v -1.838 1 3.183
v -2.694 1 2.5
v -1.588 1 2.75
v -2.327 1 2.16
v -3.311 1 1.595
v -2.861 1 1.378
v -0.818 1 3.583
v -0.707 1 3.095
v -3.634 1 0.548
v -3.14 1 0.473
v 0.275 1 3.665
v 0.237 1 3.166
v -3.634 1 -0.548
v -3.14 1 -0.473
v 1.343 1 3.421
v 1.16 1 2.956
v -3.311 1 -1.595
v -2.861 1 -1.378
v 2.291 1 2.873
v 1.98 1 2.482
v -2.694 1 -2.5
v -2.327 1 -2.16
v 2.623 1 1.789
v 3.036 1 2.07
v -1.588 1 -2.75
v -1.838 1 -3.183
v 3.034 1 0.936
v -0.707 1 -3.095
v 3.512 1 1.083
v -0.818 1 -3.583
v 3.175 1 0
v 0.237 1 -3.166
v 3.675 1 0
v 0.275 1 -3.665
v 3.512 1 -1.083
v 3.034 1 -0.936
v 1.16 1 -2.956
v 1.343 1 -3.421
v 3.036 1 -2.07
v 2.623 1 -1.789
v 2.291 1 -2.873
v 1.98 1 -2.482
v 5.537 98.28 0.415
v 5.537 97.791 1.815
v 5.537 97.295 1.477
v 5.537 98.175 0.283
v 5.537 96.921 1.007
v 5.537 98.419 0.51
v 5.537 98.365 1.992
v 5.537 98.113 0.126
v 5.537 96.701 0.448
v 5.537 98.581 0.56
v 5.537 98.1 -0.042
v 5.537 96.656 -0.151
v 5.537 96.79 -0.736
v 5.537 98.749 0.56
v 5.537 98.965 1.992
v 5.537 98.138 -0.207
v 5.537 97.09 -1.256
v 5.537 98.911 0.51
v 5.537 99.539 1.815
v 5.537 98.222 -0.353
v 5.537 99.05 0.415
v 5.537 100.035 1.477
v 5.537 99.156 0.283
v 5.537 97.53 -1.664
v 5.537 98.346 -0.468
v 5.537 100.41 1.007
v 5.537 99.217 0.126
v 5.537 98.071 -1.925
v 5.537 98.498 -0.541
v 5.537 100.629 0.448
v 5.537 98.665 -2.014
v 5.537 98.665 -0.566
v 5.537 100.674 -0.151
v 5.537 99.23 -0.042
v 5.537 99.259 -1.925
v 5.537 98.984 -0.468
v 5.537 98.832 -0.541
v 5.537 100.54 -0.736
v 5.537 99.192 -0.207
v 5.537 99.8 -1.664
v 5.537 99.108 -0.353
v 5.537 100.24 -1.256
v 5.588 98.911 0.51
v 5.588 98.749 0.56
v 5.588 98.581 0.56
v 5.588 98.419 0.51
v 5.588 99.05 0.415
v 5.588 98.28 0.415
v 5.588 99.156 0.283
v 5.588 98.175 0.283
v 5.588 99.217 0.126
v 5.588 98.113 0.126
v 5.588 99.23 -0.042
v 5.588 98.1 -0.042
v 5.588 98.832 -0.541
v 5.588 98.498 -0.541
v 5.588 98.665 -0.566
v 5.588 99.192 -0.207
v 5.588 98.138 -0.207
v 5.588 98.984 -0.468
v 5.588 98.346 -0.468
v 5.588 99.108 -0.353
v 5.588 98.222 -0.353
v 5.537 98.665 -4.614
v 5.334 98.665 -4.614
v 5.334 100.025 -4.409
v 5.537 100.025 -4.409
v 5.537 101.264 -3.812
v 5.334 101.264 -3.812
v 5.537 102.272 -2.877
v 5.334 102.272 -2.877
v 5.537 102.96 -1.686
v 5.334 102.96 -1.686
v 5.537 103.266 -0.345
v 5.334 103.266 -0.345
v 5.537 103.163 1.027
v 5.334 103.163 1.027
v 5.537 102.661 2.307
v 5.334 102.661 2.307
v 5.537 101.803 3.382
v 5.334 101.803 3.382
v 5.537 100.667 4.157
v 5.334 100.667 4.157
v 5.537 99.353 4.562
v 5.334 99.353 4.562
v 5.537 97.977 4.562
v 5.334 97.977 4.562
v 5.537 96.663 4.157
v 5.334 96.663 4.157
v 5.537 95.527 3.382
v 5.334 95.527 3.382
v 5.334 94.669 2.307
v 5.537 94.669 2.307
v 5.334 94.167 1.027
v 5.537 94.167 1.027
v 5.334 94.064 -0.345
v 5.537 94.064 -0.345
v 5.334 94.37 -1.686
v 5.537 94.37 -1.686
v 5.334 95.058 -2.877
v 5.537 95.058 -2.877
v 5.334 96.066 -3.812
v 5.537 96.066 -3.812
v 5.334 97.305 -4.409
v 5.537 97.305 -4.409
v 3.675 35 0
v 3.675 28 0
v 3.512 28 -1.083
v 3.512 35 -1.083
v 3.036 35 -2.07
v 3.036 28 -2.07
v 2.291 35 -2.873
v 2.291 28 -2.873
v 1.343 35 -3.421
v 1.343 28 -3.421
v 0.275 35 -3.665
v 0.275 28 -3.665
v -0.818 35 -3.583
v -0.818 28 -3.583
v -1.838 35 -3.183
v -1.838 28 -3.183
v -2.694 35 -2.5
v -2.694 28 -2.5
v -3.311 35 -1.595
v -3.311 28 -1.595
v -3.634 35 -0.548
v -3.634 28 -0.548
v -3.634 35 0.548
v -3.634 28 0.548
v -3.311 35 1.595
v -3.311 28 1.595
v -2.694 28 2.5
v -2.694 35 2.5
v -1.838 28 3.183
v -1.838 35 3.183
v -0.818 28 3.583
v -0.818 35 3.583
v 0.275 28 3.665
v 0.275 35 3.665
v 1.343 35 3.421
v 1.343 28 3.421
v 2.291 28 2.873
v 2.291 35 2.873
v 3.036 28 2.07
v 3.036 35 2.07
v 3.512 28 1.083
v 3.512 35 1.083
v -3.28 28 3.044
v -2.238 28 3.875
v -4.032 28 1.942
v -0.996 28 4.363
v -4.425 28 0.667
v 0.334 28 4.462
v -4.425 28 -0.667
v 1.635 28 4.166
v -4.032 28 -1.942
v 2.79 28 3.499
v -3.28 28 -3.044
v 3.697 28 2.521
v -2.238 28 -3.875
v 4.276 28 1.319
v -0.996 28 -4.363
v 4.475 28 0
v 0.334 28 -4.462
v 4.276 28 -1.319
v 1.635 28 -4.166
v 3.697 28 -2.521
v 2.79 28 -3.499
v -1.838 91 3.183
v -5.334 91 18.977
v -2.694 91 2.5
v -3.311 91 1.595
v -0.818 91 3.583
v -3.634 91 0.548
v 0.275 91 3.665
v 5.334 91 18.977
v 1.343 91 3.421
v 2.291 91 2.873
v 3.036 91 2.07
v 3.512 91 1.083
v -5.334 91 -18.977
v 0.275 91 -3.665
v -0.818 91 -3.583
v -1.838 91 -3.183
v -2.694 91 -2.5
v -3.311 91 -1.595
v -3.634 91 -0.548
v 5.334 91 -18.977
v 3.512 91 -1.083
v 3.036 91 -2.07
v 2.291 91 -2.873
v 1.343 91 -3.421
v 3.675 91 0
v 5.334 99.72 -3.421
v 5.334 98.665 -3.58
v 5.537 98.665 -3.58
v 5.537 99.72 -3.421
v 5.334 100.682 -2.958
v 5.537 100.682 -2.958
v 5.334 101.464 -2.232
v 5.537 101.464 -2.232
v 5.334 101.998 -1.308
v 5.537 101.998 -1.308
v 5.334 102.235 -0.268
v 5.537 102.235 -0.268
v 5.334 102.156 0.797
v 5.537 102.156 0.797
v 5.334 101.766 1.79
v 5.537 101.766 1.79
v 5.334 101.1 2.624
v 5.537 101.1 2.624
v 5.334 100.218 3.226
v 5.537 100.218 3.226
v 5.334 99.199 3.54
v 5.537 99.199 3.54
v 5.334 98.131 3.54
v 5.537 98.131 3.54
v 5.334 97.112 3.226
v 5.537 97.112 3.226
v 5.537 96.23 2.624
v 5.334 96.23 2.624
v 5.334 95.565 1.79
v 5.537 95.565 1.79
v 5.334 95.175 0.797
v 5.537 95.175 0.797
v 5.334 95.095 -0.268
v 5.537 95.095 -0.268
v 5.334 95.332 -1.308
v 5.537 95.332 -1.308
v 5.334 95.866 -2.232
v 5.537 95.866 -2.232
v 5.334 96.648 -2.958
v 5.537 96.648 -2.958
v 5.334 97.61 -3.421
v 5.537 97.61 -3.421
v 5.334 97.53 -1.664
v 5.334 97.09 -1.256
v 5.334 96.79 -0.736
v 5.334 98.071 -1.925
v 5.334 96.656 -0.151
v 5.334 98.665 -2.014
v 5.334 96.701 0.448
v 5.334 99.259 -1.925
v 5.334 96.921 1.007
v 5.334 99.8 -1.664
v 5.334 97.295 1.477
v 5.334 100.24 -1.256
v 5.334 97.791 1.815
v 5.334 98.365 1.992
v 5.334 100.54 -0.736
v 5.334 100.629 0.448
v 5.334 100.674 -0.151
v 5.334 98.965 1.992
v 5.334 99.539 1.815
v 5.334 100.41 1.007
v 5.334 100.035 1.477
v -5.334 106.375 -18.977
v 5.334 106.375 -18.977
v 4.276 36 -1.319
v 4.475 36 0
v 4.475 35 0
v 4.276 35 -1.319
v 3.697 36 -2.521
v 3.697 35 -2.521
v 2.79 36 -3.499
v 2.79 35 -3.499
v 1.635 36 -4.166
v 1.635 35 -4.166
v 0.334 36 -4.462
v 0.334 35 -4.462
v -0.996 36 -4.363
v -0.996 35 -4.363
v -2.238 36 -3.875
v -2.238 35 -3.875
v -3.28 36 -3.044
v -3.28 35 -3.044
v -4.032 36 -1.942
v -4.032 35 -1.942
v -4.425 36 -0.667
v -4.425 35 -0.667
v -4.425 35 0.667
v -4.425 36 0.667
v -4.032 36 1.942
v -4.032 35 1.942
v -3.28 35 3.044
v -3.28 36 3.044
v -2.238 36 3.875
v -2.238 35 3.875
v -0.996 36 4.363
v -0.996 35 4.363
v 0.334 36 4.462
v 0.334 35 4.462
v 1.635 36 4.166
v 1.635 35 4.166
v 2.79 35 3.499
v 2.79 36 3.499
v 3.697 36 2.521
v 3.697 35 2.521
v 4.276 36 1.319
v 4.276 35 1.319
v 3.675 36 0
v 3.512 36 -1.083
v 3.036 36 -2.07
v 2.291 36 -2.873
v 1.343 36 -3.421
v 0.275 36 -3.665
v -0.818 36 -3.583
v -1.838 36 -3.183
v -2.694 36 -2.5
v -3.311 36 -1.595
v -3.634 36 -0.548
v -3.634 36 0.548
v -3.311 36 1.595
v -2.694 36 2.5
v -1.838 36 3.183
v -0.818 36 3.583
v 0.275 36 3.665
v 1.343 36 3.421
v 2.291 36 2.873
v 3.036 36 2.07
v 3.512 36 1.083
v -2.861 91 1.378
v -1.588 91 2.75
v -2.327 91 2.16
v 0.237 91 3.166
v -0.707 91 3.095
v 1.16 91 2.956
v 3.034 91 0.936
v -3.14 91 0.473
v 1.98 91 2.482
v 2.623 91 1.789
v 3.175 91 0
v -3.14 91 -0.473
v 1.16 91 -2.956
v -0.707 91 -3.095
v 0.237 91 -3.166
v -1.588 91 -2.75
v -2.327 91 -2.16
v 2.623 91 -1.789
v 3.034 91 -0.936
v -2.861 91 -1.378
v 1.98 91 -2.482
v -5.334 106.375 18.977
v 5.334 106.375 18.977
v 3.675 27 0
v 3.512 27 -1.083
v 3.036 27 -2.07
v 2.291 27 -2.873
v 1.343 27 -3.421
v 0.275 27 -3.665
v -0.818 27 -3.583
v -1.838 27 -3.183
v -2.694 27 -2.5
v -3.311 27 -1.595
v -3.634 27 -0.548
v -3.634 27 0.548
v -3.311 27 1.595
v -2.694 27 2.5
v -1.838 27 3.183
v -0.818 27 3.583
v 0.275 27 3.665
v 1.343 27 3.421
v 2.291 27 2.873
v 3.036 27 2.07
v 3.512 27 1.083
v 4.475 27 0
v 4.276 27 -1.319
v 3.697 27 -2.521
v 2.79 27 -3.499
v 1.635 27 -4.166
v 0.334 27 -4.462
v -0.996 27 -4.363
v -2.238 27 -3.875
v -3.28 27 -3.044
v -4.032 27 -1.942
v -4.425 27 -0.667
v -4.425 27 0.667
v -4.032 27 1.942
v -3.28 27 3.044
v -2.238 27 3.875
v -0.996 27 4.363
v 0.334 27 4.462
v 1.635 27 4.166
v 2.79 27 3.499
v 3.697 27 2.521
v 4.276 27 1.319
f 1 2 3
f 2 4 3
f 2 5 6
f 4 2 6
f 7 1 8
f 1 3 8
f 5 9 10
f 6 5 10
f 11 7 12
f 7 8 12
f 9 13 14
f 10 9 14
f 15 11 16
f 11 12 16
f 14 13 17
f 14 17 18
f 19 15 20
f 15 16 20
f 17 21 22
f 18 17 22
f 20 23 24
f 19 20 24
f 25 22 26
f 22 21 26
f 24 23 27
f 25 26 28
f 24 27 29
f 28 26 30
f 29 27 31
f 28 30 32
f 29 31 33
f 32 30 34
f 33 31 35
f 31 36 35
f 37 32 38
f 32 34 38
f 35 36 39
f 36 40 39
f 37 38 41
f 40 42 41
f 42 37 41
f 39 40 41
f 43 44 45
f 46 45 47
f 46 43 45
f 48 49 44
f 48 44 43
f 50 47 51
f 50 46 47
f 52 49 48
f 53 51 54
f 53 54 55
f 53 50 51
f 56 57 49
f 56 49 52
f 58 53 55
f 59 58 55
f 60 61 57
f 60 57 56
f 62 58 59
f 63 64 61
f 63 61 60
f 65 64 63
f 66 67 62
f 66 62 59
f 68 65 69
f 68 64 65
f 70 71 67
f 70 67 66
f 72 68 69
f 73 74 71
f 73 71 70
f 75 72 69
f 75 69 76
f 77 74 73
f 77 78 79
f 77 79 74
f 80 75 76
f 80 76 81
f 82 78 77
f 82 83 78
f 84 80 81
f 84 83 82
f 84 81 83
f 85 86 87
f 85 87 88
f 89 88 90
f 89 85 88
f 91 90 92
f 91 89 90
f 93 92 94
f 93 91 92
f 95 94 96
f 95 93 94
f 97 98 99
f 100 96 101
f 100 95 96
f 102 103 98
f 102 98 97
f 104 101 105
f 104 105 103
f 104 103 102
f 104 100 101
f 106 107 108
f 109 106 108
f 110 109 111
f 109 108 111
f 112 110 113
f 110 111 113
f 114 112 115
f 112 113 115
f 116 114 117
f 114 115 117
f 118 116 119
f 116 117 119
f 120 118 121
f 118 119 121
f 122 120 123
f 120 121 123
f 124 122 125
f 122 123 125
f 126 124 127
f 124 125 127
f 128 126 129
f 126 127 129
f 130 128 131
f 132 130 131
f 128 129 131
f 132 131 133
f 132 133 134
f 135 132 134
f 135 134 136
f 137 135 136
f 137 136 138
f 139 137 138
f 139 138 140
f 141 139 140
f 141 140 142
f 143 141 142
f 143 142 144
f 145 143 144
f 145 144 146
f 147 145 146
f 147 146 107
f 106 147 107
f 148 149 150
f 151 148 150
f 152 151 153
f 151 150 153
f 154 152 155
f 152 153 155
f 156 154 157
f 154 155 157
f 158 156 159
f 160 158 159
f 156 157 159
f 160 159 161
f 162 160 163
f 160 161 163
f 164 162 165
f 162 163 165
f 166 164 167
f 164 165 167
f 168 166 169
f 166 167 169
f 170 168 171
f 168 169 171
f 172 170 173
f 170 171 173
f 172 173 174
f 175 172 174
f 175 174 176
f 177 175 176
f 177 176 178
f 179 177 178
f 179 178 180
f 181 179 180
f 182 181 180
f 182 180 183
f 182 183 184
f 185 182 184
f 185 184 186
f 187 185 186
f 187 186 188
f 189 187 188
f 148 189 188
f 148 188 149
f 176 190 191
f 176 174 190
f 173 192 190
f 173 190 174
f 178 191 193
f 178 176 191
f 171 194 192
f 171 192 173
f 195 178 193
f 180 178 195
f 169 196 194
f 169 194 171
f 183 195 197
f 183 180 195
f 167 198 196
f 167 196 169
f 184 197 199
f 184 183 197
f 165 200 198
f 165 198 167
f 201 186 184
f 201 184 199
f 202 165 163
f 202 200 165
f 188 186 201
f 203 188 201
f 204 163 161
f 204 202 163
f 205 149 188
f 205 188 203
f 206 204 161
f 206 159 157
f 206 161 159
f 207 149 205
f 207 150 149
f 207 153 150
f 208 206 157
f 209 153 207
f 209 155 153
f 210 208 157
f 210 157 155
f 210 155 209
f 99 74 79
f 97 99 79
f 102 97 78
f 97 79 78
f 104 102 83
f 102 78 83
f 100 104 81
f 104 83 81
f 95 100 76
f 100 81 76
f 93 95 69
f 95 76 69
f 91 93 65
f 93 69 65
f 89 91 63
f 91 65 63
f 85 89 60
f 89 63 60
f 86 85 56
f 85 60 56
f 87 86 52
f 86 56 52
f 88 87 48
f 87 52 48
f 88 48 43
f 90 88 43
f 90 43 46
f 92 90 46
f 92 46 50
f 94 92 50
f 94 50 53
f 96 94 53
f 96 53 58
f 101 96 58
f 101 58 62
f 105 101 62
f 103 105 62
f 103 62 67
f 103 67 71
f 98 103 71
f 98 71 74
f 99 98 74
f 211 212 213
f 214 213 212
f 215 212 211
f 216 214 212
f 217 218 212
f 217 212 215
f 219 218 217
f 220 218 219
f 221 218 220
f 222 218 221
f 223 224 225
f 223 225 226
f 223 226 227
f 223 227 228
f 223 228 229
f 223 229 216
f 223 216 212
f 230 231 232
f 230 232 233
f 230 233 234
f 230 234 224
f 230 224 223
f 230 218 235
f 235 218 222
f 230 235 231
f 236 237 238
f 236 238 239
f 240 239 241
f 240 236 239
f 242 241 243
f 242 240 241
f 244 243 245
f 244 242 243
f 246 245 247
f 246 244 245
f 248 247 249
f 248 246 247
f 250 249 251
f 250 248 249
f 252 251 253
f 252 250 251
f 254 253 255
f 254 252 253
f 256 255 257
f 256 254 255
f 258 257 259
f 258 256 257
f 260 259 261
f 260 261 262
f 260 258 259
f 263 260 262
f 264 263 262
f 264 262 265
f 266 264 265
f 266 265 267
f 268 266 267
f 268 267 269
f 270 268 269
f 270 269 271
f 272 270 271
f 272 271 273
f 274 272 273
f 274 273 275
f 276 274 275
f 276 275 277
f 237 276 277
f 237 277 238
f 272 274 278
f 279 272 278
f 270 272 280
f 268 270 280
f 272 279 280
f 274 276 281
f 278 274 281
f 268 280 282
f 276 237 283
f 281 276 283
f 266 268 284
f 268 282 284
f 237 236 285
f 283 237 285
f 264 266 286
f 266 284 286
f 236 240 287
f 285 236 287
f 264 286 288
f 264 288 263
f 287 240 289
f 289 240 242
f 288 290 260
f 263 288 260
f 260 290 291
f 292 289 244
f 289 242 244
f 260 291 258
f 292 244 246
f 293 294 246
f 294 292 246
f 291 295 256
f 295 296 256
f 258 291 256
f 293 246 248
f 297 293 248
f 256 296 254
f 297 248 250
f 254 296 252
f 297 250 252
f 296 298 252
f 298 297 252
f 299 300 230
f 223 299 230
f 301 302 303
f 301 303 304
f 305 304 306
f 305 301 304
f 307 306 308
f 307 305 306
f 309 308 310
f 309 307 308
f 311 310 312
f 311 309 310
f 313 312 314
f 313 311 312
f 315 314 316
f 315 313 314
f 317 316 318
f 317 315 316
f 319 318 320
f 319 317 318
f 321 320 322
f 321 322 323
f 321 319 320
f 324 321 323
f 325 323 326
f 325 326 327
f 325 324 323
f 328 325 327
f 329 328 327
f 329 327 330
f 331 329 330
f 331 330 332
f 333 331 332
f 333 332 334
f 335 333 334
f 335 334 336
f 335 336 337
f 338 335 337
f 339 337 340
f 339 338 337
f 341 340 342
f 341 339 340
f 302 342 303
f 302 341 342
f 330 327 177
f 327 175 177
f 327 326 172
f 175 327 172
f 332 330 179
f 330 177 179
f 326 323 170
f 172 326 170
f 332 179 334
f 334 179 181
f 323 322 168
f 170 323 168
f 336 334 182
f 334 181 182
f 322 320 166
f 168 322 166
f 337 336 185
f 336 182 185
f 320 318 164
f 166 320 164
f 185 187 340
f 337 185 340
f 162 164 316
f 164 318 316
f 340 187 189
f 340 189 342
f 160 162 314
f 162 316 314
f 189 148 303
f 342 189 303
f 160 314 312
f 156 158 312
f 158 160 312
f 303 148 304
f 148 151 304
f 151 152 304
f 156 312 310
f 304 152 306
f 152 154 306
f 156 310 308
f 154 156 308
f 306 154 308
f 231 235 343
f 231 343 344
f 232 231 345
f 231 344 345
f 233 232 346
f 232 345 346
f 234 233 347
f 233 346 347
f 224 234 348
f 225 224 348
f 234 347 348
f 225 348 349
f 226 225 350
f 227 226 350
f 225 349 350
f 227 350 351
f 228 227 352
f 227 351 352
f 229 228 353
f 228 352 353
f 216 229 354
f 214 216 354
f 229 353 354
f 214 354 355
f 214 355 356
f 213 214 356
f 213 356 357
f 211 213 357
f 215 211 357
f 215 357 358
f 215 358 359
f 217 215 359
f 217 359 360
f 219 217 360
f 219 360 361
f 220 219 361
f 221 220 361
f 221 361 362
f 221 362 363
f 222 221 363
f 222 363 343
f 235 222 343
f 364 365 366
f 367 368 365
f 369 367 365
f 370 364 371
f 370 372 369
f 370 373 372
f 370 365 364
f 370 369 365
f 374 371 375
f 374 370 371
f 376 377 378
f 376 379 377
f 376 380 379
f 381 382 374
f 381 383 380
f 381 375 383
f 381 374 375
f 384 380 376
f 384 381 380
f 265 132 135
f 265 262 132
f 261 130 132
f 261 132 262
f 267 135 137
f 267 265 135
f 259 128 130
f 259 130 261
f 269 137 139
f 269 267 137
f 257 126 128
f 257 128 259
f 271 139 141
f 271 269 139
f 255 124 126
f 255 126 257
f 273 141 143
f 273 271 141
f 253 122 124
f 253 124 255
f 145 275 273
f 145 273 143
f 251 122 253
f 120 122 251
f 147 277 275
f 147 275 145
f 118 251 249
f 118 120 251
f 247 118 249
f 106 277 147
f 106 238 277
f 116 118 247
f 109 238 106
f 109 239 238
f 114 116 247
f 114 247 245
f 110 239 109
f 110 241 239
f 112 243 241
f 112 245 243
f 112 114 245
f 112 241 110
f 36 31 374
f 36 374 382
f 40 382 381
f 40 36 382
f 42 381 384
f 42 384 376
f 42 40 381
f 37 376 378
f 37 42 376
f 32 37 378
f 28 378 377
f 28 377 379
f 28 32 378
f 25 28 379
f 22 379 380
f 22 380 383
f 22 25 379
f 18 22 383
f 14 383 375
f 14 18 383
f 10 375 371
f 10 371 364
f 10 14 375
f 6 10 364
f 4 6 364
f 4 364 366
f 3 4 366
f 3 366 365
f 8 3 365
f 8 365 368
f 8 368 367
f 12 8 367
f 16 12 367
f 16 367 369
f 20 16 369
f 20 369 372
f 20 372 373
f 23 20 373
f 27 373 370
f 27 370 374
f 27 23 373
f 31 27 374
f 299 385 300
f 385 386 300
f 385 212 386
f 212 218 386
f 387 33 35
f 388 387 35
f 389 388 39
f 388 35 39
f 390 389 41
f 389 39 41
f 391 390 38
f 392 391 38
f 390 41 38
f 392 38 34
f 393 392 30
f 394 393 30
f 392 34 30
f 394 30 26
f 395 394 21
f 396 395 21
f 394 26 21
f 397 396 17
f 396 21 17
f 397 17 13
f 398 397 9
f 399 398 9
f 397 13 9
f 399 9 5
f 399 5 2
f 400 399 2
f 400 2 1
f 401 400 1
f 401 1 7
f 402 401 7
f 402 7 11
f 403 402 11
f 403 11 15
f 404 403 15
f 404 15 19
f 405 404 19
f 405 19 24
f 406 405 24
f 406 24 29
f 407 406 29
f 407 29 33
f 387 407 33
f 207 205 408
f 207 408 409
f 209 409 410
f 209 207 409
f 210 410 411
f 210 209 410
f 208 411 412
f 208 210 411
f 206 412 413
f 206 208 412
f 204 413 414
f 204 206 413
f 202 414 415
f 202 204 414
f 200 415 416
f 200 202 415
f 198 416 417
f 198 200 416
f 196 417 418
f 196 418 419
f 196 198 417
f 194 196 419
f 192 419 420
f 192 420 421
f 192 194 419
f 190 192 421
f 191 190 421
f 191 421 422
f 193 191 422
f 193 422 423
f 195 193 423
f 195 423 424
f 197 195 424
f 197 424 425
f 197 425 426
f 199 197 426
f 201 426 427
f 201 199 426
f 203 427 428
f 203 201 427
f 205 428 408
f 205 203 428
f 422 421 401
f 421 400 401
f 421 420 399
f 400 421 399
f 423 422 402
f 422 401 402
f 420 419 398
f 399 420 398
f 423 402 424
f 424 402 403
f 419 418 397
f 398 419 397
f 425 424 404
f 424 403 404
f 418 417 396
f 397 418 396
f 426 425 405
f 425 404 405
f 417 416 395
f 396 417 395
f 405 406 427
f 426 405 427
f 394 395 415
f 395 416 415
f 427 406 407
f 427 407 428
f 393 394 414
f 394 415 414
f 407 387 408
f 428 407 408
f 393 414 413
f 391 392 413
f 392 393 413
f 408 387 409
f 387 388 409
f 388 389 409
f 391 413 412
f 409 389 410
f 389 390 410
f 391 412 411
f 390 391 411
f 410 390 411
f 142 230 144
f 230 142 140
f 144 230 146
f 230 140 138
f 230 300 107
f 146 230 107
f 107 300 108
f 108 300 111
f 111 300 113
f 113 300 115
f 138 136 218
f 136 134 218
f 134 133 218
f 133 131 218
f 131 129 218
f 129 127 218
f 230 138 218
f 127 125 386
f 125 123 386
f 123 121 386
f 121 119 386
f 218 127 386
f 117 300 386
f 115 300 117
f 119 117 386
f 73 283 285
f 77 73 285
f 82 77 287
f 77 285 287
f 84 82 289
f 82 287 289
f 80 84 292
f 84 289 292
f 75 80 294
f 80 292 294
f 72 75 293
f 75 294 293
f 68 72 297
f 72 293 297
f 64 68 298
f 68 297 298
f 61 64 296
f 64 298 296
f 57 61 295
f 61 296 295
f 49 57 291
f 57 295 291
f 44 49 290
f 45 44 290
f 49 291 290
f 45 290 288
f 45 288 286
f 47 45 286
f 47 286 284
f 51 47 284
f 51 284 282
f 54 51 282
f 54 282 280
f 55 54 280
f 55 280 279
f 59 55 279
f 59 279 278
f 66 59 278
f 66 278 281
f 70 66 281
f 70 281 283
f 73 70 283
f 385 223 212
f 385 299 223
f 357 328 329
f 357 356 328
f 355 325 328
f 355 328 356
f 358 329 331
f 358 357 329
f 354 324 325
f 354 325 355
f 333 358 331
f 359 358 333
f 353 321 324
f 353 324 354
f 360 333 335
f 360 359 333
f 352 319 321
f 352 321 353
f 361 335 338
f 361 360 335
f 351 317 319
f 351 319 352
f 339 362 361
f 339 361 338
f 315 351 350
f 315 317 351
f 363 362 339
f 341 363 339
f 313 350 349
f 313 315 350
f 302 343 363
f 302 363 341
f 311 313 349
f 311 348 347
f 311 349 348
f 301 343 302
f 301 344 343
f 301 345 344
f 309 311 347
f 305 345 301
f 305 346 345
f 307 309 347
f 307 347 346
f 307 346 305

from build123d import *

# Parameters (mm, degrees)
SKETCH2_R            = 36.75
SKETCH2_R_2          = 31.75
BOSS_EXTRUDE2_DEPTH  = 900
BOSS_EXTRUDE10_DEPTH = 5
CIRPATTERN3_COUNT    = 4
BOSS_EXTRUDE11_START = -10
SKETCH5_R            = 44.75
SKETCH5_R_2          = 36.75
BOSS_EXTRUDE11_DEPTH = 10
LPATTERN1_COUNT      = 2
LPATTERN1_PITCH      = 80
BOSS_EXTRUDE12_DEPTH = 53.34
SKETCH7_R            = 46.138276775
SKETCH7_R_2          = 35.802049151
BOSS_EXTRUDE15_DEPTH = 55.372
SKETCH8_R            = 20.14340108
BOSS_EXTRUDE16_DEPTH = 55.372
SKETCH9_R            = 5.663284778
BOSS_EXTRUDE18_DEPTH = 55.88
SCALE1_SCALE         = 0.1


with BuildPart() as part:
    # Sketch2 → Boss-Extrude2 (new body)
    with BuildSketch(Plane(origin=(0, 10, 0), x_dir=(1, 0, 0), z_dir=(0, 1, 0))):
        Circle(SKETCH2_R)
        Circle(SKETCH2_R_2, mode=Mode.SUBTRACT)
    extrude(amount=BOSS_EXTRUDE2_DEPTH)

    # Sketch5 → Boss-Extrude11 (add)
    with BuildSketch(Plane(origin=(0, 280.000000004, 0), x_dir=(1, 0, 0), z_dir=(0, 1, 0)).offset(BOSS_EXTRUDE11_START)):
        Circle(SKETCH5_R)
        Circle(SKETCH5_R_2, mode=Mode.SUBTRACT)
    boss_extrude11 = extrude(amount=BOSS_EXTRUDE11_DEPTH)

    # LPattern1: Boss-Extrude11 ×2
    with Locations(*[(0, i * LPATTERN1_PITCH, 0) for i in range(1, LPATTERN1_COUNT)]):
        add(boss_extrude11)

    # Sketch6 → Boss-Extrude12 (add, symmetric)
    with BuildSketch(Plane(origin=(0, 0, 0), x_dir=(0, 0, -1), z_dir=(1, 0, 0))):
        Polygon((-36.75, 910), (-189.768574018, 910), (-189.768574018, 1063.746484801), (189.768574018, 1063.746484801), (189.768574018, 910), (36.75, 910), align=None)
    extrude(amount=BOSS_EXTRUDE12_DEPTH, both=True)

    # Sketch7 → Boss-Extrude15 (add)
    with BuildSketch(Plane(origin=(0, 0, 0), x_dir=(0, 0, -1), z_dir=(1, 0, 0))):
        with Locations((0, 986.650763521)):
            Circle(SKETCH7_R)
        with Locations((0, 986.650763521)):
            Circle(SKETCH7_R_2, mode=Mode.SUBTRACT)
    extrude(amount=BOSS_EXTRUDE15_DEPTH)

    # Sketch8 → Boss-Extrude16 (add)
    with BuildSketch(Plane(origin=(0, 0, 0), x_dir=(0, 0, -1), z_dir=(1, 0, 0))):
        with Locations((0, 986.650763521)):
            Circle(SKETCH8_R)
    extrude(amount=BOSS_EXTRUDE16_DEPTH)

    # Sketch9 → Boss-Extrude18 (add)
    with BuildSketch(Plane(origin=(0, 0, 0), x_dir=(0, 0, -1), z_dir=(1, 0, 0))):
        with Locations((0, 986.650763521)):
            Circle(SKETCH9_R)
    extrude(amount=BOSS_EXTRUDE18_DEPTH)


with BuildPart() as body_2:
    # Sketch4 → Boss-Extrude10 (new, symmetric)
    with BuildSketch(Plane.XY):
        Polygon((-125, 10), (-125, 37.123747586), (-87.807861708, 71.973477342), (-36.75, 71.973477342), (-36.75, 10), align=None)
    extrude(amount=BOSS_EXTRUDE10_DEPTH, both=True)


with BuildPart() as cirpattern3_1:
    # CirPattern3: pattern copy
    add(body_2.part.rotate(Axis((0, 0, 0), (0, -1, 0)), 1 * 360 / CIRPATTERN3_COUNT))


with BuildPart() as cirpattern3_2:
    # CirPattern3: pattern copy
    add(body_2.part.rotate(Axis((0, 0, 0), (0, -1, 0)), 2 * 360 / CIRPATTERN3_COUNT))


with BuildPart() as cirpattern3_3:
    # CirPattern3: pattern copy
    add(body_2.part.rotate(Axis((0, 0, 0), (0, -1, 0)), 3 * 360 / CIRPATTERN3_COUNT))


with BuildPart() as part_1:
    # Scale1: scaled about (0, 0, 0)
    add(part.part.scale(SCALE1_SCALE))


solid = part_1.part
